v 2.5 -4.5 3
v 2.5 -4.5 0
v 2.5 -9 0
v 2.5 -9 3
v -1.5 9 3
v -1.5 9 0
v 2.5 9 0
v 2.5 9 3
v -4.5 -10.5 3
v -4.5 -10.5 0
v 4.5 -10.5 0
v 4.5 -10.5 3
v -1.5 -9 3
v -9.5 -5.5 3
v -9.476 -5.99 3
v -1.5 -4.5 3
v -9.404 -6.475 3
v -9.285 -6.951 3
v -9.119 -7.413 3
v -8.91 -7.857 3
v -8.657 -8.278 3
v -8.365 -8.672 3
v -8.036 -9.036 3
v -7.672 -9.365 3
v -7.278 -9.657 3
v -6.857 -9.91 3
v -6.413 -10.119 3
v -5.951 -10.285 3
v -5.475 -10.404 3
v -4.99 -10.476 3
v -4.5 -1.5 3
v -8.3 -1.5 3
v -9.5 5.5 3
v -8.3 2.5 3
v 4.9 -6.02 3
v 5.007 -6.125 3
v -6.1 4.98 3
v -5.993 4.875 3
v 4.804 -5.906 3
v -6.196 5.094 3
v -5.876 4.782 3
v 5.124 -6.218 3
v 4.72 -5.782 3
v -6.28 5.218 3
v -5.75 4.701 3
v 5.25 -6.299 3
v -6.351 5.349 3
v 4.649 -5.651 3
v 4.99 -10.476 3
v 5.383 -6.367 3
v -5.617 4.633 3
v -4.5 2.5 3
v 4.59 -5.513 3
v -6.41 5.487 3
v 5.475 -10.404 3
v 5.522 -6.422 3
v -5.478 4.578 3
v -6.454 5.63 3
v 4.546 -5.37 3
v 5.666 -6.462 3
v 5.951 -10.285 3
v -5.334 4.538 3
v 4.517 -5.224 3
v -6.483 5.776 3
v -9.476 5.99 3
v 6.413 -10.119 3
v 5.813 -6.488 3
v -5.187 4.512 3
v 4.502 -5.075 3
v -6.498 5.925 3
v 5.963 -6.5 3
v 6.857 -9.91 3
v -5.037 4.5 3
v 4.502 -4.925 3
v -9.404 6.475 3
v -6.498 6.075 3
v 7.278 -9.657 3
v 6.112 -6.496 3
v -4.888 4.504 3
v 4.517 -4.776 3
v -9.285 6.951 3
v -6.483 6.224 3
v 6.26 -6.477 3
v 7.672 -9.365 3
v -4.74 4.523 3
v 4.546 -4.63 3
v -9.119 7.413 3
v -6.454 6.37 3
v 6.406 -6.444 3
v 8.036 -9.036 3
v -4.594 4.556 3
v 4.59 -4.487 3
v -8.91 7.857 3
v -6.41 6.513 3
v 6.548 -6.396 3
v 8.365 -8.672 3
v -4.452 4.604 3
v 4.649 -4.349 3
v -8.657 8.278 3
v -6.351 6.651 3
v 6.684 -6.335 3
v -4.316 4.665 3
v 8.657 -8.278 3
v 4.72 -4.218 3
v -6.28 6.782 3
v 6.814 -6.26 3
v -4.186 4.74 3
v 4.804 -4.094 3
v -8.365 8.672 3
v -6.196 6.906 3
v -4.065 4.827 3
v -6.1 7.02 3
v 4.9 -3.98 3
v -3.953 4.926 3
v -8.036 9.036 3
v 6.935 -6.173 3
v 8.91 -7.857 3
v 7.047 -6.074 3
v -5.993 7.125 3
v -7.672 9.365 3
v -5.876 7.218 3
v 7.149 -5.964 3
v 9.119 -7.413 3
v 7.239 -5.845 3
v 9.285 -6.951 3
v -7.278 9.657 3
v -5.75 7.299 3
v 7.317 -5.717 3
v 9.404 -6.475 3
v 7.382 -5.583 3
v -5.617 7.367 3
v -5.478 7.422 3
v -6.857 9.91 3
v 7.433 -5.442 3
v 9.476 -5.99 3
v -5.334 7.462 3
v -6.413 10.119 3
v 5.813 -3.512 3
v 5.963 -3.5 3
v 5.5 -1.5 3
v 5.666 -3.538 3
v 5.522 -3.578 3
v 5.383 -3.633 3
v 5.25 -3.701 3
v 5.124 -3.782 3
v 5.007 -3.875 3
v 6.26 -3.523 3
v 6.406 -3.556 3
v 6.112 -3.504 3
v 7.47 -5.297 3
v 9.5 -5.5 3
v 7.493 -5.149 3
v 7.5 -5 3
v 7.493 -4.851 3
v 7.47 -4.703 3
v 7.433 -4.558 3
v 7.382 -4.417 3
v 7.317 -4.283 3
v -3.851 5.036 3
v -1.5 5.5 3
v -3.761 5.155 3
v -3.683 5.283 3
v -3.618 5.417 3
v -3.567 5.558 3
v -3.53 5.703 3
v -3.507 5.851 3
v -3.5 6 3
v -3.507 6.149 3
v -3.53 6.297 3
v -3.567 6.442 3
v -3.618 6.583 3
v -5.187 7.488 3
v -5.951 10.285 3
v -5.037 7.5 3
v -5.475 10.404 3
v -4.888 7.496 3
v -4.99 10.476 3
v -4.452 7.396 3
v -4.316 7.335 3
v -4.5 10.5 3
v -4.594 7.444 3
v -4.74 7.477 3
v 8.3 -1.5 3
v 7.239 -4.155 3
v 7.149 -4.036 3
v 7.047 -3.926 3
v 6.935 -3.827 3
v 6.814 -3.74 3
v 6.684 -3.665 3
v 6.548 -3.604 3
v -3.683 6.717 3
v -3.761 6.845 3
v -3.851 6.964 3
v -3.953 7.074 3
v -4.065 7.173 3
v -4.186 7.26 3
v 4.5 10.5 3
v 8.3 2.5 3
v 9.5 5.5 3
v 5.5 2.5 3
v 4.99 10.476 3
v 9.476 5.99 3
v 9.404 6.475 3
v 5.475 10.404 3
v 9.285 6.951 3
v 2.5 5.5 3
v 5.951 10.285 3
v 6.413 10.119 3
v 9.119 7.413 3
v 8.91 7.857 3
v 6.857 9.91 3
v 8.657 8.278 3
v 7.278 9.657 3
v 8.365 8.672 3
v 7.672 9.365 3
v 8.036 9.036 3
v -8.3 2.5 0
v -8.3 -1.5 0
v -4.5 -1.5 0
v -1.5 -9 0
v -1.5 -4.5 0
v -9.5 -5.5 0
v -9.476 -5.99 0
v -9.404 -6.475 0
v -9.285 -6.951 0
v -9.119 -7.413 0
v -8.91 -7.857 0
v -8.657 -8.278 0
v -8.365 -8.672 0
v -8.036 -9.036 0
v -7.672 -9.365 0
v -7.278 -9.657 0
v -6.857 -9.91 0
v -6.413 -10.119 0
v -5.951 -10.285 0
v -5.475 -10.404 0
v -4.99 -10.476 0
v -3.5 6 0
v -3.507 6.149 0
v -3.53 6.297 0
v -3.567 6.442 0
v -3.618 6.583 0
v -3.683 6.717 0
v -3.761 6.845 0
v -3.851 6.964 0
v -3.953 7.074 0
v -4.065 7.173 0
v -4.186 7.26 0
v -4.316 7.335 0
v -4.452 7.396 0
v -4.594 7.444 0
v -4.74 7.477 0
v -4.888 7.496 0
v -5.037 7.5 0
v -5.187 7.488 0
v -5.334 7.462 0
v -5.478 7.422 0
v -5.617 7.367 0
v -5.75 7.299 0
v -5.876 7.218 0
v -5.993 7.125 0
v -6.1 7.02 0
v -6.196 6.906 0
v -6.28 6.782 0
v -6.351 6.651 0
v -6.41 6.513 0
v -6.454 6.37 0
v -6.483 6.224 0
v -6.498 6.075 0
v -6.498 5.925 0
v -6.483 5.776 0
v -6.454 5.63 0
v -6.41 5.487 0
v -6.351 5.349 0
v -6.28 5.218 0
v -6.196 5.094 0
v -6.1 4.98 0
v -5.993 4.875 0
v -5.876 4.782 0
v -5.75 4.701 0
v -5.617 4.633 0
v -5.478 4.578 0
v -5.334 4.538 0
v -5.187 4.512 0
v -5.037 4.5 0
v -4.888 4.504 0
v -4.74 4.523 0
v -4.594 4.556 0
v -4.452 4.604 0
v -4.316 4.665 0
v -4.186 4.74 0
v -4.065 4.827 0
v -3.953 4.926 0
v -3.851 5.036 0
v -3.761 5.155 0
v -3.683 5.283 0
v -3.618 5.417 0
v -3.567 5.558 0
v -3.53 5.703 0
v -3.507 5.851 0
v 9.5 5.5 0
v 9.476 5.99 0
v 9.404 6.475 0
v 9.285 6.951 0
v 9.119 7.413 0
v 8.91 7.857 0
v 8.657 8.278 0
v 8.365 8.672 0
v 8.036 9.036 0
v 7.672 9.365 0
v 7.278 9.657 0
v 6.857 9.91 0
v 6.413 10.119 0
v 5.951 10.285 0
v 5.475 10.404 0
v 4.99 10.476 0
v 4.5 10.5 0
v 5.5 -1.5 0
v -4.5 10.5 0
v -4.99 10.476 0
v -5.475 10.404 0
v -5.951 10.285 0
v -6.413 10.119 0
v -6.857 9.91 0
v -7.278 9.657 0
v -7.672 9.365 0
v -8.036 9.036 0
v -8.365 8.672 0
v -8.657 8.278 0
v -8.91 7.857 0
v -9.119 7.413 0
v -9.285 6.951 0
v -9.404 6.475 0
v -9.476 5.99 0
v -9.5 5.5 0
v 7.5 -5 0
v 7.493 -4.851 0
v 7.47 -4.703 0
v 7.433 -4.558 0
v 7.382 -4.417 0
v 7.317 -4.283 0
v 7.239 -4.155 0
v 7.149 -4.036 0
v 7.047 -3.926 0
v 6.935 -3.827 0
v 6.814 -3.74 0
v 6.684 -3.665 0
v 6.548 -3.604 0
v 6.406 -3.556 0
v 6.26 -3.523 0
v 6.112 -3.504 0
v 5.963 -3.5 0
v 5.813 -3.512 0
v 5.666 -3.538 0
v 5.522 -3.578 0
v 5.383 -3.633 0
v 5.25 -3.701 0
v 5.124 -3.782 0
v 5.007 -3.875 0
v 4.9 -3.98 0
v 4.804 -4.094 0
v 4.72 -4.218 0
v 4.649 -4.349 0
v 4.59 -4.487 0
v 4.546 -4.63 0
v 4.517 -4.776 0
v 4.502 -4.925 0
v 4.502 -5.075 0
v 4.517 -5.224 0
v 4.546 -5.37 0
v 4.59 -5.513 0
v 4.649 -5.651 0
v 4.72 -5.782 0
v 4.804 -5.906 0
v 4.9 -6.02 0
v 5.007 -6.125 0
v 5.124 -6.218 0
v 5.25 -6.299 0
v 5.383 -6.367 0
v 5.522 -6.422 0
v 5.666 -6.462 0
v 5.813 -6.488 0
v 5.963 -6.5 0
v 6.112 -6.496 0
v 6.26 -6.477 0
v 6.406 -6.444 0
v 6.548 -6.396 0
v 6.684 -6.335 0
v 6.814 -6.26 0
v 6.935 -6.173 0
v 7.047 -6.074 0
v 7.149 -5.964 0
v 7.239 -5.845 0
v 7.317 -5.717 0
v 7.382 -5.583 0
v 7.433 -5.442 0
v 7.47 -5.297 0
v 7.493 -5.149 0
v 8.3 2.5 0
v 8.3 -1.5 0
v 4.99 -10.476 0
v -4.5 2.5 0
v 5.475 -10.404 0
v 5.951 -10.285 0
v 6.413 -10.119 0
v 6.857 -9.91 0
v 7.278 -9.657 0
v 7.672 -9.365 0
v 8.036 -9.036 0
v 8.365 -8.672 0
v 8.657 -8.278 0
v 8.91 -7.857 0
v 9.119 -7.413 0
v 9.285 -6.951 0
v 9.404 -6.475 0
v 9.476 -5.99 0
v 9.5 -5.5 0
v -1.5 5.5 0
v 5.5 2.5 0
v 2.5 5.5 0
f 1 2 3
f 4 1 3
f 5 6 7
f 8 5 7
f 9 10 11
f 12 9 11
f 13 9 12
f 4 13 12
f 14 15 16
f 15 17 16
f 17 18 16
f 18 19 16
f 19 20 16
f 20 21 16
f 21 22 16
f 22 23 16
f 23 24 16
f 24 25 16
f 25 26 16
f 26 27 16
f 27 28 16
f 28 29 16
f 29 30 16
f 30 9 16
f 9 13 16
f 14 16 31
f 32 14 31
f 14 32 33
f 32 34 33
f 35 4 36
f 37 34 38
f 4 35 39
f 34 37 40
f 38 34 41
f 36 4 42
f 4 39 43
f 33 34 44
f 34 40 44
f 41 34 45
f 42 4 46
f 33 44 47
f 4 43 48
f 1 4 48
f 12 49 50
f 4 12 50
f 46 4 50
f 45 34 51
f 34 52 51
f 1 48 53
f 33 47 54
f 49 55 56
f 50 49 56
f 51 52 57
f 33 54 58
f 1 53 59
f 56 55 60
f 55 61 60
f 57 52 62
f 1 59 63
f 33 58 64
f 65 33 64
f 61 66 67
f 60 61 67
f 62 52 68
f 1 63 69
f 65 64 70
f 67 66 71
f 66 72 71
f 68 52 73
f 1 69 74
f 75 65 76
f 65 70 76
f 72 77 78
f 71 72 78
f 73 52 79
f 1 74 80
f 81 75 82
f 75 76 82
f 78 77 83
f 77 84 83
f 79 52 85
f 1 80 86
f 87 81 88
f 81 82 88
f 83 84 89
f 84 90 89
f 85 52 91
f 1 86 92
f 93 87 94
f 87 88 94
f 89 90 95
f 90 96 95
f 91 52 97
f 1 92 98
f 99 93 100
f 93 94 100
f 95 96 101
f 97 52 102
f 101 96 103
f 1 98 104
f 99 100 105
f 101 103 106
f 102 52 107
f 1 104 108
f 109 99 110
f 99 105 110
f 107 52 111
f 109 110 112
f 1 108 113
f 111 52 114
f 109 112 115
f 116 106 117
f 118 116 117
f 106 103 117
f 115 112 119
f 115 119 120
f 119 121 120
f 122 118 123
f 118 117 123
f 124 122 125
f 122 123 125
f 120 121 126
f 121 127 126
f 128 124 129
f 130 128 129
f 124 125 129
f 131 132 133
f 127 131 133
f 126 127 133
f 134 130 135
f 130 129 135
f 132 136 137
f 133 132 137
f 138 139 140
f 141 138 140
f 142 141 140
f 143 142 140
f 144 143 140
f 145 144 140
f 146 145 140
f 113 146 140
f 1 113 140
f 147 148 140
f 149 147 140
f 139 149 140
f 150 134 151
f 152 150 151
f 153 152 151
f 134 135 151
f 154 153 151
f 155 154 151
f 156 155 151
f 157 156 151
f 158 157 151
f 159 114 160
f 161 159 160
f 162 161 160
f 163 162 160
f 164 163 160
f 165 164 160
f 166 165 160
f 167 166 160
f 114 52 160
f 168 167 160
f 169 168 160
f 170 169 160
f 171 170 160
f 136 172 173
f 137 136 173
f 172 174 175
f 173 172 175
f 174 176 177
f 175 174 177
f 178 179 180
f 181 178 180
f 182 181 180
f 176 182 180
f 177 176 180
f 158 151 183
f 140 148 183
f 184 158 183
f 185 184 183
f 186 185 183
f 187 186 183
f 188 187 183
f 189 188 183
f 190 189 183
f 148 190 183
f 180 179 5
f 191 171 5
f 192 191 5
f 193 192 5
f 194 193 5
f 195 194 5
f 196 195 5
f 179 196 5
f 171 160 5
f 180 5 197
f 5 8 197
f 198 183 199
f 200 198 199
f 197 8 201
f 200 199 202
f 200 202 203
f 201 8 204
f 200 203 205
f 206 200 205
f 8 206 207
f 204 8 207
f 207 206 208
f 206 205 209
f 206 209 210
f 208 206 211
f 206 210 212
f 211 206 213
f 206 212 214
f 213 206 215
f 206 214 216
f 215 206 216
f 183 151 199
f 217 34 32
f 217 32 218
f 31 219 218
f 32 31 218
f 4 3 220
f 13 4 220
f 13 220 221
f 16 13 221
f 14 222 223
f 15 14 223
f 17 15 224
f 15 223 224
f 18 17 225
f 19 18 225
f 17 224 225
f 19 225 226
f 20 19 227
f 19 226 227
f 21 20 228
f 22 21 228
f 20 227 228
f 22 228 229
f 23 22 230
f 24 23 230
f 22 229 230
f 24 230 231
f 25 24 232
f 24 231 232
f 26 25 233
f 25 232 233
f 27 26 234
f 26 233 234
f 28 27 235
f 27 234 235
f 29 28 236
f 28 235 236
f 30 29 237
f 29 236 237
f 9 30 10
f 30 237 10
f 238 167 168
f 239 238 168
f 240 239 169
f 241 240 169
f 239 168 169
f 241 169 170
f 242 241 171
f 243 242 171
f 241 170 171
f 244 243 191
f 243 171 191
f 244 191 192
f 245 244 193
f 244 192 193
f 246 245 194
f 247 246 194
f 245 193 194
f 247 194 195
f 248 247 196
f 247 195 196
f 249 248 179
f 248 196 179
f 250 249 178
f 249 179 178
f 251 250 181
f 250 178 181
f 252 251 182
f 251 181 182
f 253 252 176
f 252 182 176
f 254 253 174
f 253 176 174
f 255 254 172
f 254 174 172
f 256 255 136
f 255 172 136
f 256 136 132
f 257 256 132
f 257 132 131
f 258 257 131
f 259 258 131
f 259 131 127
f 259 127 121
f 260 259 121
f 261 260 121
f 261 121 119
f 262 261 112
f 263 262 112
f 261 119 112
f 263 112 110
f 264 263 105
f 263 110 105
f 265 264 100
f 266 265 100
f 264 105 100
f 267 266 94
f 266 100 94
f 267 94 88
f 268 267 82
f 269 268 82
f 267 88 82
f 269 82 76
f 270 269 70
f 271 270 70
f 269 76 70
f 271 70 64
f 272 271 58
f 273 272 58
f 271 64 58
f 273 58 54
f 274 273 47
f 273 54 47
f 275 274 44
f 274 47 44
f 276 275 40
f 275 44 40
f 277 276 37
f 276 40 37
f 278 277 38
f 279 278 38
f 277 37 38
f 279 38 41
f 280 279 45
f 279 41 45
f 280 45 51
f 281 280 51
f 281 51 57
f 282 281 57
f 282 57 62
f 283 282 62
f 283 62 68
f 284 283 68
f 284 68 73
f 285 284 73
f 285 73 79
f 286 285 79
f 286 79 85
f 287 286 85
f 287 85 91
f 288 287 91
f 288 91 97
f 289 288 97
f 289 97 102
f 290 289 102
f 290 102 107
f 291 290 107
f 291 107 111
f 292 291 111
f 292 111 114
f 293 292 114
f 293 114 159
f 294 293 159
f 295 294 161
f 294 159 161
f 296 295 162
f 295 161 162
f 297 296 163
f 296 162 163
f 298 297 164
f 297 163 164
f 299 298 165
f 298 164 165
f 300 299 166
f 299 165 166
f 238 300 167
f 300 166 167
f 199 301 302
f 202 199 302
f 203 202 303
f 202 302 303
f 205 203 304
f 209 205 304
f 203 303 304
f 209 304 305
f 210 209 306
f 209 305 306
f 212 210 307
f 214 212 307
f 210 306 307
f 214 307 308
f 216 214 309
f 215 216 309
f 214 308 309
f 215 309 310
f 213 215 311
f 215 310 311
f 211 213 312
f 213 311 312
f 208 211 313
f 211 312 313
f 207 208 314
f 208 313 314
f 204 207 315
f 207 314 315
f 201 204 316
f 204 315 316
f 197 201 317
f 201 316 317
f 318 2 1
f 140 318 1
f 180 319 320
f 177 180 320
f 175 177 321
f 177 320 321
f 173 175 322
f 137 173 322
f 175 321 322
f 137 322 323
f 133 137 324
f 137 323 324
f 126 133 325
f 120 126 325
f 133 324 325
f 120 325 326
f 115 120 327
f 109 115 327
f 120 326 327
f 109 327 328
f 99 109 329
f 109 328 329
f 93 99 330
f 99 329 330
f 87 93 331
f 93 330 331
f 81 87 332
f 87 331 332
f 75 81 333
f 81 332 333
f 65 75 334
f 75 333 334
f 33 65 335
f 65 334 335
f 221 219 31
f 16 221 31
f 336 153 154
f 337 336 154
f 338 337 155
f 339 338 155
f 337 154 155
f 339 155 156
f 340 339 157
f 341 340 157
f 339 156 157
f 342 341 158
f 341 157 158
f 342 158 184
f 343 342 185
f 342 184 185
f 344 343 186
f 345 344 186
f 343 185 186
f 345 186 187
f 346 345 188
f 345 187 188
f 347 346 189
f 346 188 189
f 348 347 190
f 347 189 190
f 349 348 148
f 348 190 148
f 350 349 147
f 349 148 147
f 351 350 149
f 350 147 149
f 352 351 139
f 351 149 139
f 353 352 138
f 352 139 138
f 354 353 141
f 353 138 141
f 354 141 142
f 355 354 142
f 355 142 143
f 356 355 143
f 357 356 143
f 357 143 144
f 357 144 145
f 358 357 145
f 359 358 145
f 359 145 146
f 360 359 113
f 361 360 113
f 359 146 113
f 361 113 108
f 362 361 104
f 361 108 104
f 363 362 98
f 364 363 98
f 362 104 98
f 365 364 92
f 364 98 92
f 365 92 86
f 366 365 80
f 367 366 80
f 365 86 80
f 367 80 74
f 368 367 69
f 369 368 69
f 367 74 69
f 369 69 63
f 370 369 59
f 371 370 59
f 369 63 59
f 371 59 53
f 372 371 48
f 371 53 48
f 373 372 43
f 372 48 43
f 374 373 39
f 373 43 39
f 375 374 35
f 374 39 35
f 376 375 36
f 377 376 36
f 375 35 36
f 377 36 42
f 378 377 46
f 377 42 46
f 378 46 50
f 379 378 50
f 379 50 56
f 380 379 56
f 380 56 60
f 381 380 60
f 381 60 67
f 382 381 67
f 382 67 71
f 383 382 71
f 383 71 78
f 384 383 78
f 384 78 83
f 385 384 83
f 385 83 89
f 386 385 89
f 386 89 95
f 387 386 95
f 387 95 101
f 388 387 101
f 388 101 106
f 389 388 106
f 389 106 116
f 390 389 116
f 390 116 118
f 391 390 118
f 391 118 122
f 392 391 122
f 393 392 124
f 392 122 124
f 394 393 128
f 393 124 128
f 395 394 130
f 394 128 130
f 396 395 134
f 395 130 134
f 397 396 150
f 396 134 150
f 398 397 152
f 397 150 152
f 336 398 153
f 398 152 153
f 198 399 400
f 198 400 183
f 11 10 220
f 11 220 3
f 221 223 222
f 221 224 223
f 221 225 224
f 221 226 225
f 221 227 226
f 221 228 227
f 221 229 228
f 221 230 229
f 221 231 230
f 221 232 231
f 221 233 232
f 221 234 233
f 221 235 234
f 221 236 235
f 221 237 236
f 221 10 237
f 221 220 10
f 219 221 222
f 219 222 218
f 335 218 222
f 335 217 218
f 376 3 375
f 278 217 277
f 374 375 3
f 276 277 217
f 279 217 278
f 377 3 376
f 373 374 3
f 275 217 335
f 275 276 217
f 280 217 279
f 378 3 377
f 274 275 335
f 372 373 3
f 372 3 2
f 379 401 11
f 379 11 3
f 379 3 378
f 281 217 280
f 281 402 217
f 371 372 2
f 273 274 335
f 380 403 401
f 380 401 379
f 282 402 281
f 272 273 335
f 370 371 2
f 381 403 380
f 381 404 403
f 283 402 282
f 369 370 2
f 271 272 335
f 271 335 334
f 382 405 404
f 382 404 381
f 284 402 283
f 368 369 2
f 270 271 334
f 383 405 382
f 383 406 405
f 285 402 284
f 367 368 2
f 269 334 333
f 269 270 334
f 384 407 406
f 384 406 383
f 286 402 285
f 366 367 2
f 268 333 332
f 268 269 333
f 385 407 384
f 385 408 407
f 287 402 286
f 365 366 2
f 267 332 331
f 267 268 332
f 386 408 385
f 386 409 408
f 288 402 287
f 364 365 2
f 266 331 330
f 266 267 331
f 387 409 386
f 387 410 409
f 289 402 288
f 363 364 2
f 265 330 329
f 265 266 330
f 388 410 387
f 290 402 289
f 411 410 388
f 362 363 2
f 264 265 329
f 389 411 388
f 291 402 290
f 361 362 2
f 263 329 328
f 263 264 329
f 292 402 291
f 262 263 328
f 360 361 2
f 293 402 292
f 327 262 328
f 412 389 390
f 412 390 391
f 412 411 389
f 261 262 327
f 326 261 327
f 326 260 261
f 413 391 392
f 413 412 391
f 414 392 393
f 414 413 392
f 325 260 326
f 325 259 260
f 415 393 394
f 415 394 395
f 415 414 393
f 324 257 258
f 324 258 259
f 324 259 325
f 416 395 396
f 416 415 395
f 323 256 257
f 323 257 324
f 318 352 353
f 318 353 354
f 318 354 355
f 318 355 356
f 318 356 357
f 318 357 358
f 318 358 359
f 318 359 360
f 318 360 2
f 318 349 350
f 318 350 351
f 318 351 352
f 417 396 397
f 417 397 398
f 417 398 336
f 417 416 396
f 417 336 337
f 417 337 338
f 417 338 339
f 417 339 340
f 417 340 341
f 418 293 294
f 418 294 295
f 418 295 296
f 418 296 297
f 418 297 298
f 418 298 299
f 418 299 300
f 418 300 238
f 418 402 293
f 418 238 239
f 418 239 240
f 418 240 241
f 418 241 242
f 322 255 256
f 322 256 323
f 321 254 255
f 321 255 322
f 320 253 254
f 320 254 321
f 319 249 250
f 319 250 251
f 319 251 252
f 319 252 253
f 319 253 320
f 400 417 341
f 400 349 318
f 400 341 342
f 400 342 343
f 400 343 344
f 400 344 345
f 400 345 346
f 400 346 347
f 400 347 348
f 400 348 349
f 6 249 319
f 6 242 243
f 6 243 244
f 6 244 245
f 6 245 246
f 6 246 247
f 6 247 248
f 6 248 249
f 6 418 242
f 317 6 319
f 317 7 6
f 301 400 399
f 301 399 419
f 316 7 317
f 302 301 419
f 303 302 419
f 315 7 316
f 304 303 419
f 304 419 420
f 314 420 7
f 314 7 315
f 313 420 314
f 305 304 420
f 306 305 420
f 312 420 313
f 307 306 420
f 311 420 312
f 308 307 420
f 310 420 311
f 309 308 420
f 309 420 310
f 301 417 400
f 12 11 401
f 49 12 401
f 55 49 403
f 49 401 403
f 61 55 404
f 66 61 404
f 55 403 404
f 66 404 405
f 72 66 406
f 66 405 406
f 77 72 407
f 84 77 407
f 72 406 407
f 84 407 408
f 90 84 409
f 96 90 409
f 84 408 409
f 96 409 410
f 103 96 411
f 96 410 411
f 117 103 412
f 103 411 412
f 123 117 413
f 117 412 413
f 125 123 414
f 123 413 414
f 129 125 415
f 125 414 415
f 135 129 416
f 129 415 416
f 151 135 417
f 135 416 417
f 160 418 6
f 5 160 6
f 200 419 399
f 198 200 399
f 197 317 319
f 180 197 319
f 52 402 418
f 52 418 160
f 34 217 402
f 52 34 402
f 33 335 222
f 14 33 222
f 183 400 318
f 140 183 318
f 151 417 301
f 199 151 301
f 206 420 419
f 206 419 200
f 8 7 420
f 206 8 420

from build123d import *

# Parameters (mm, degrees)
RESSALTO_EXTRUS_O1_DEPTH = 3
CORTE_EXTRUS_O1_DEPTH    = 3
ESBO_O3_R                = 1.5
CORTE_EXTRUS_O2_DEPTH    = 3
CHANFRO1_SIZE            = 3
ESBO_O4_W                = 3
ESBO_O4_H                = 4
RESSALTO_EXTRUS_O2_DEPTH = 0.7
ESBO_O5_W                = 3
ESBO_O5_H                = 4
RESSALTO_EXTRUS_O3_DEPTH = 0.7


with BuildPart() as part:
    # Esboço1 → Ressalto-extrusão1 (new body)
    with BuildSketch(Plane.XY):
        with BuildLine():
            Line((4.5, 10.5), (-4.5, 10.5))
            ThreePointArc((-4.5, 10.5), (-8.035533906, 9.035533906), (-9.5, 5.5))
            Line((-9.5, 5.5), (-9.5, -5.5))
            ThreePointArc((-9.5, -5.5), (-8.035533906, -9.035533906), (-4.5, -10.5))
            Line((-4.5, -10.5), (4.5, -10.5))
            ThreePointArc((4.5, -10.5), (8.035533906, -9.035533906), (9.5, -5.5))
            Line((9.5, -5.5), (9.5, 5.5))
            ThreePointArc((9.5, 5.5), (8.035533906, 9.035533906), (4.5, 10.5))
        make_face()
    extrude(amount=RESSALTO_EXTRUS_O1_DEPTH)

    # Esboço2 → Corte-extrusão1 (cut)
    with BuildSketch(Plane(origin=(0, 0, 0), x_dir=(-1, 0, 0), z_dir=(0, 0, -1))):
        Polygon((-2.5, -1.5), (-2.5, -9), (1.5, -9), (1.5, -1.5), (9, -1.5), (9, 2.5), (1.5, 2.5), (1.5, 9), (-2.5, 9), (-2.5, 2.5), (-9, 2.5), (-9, -1.5), align=None)
    extrude(amount=-CORTE_EXTRUS_O1_DEPTH, mode=Mode.SUBTRACT)

    # Esboço3 → Corte-extrusão2 (cut)
    with BuildSketch(Plane.XY.offset(3)):
        with Locations((6, -5)):
            Circle(ESBO_O3_R)
        with Locations((-5, 6)):
            Circle(ESBO_O3_R)
    extrude(amount=-CORTE_EXTRUS_O2_DEPTH, mode=Mode.SUBTRACT)

    # Chanfro1
    chanfro1_edges = [part.edges().sort_by_distance(p)[0] for p in [
        (2.5, -1.5, 1.5),
        (2.5, 2.5, 1.5),
        (-1.5, 2.5, 1.5),
        (-1.5, -1.5, 1.5),
    ]]
    chamfer(chanfro1_edges, length=CHANFRO1_SIZE)

    # Esboço4 → Ressalto-extrusão2 (add)
    with BuildSketch(Plane(origin=(-9, 0, 0), x_dir=(0, 0, -1), z_dir=(1, 0, 0))):
        with Locations((-1.5, 0.5)):
            Rectangle(ESBO_O4_W, ESBO_O4_H)
    extrude(amount=RESSALTO_EXTRUS_O2_DEPTH)

    # Esboço5 → Ressalto-extrusão3 (add)
    with BuildSketch(Plane.ZY.offset(-9)):
        with Locations((1.5, 0.5)):
            Rectangle(ESBO_O5_W, ESBO_O5_H)
    extrude(amount=RESSALTO_EXTRUS_O3_DEPTH)


solid = part.part
